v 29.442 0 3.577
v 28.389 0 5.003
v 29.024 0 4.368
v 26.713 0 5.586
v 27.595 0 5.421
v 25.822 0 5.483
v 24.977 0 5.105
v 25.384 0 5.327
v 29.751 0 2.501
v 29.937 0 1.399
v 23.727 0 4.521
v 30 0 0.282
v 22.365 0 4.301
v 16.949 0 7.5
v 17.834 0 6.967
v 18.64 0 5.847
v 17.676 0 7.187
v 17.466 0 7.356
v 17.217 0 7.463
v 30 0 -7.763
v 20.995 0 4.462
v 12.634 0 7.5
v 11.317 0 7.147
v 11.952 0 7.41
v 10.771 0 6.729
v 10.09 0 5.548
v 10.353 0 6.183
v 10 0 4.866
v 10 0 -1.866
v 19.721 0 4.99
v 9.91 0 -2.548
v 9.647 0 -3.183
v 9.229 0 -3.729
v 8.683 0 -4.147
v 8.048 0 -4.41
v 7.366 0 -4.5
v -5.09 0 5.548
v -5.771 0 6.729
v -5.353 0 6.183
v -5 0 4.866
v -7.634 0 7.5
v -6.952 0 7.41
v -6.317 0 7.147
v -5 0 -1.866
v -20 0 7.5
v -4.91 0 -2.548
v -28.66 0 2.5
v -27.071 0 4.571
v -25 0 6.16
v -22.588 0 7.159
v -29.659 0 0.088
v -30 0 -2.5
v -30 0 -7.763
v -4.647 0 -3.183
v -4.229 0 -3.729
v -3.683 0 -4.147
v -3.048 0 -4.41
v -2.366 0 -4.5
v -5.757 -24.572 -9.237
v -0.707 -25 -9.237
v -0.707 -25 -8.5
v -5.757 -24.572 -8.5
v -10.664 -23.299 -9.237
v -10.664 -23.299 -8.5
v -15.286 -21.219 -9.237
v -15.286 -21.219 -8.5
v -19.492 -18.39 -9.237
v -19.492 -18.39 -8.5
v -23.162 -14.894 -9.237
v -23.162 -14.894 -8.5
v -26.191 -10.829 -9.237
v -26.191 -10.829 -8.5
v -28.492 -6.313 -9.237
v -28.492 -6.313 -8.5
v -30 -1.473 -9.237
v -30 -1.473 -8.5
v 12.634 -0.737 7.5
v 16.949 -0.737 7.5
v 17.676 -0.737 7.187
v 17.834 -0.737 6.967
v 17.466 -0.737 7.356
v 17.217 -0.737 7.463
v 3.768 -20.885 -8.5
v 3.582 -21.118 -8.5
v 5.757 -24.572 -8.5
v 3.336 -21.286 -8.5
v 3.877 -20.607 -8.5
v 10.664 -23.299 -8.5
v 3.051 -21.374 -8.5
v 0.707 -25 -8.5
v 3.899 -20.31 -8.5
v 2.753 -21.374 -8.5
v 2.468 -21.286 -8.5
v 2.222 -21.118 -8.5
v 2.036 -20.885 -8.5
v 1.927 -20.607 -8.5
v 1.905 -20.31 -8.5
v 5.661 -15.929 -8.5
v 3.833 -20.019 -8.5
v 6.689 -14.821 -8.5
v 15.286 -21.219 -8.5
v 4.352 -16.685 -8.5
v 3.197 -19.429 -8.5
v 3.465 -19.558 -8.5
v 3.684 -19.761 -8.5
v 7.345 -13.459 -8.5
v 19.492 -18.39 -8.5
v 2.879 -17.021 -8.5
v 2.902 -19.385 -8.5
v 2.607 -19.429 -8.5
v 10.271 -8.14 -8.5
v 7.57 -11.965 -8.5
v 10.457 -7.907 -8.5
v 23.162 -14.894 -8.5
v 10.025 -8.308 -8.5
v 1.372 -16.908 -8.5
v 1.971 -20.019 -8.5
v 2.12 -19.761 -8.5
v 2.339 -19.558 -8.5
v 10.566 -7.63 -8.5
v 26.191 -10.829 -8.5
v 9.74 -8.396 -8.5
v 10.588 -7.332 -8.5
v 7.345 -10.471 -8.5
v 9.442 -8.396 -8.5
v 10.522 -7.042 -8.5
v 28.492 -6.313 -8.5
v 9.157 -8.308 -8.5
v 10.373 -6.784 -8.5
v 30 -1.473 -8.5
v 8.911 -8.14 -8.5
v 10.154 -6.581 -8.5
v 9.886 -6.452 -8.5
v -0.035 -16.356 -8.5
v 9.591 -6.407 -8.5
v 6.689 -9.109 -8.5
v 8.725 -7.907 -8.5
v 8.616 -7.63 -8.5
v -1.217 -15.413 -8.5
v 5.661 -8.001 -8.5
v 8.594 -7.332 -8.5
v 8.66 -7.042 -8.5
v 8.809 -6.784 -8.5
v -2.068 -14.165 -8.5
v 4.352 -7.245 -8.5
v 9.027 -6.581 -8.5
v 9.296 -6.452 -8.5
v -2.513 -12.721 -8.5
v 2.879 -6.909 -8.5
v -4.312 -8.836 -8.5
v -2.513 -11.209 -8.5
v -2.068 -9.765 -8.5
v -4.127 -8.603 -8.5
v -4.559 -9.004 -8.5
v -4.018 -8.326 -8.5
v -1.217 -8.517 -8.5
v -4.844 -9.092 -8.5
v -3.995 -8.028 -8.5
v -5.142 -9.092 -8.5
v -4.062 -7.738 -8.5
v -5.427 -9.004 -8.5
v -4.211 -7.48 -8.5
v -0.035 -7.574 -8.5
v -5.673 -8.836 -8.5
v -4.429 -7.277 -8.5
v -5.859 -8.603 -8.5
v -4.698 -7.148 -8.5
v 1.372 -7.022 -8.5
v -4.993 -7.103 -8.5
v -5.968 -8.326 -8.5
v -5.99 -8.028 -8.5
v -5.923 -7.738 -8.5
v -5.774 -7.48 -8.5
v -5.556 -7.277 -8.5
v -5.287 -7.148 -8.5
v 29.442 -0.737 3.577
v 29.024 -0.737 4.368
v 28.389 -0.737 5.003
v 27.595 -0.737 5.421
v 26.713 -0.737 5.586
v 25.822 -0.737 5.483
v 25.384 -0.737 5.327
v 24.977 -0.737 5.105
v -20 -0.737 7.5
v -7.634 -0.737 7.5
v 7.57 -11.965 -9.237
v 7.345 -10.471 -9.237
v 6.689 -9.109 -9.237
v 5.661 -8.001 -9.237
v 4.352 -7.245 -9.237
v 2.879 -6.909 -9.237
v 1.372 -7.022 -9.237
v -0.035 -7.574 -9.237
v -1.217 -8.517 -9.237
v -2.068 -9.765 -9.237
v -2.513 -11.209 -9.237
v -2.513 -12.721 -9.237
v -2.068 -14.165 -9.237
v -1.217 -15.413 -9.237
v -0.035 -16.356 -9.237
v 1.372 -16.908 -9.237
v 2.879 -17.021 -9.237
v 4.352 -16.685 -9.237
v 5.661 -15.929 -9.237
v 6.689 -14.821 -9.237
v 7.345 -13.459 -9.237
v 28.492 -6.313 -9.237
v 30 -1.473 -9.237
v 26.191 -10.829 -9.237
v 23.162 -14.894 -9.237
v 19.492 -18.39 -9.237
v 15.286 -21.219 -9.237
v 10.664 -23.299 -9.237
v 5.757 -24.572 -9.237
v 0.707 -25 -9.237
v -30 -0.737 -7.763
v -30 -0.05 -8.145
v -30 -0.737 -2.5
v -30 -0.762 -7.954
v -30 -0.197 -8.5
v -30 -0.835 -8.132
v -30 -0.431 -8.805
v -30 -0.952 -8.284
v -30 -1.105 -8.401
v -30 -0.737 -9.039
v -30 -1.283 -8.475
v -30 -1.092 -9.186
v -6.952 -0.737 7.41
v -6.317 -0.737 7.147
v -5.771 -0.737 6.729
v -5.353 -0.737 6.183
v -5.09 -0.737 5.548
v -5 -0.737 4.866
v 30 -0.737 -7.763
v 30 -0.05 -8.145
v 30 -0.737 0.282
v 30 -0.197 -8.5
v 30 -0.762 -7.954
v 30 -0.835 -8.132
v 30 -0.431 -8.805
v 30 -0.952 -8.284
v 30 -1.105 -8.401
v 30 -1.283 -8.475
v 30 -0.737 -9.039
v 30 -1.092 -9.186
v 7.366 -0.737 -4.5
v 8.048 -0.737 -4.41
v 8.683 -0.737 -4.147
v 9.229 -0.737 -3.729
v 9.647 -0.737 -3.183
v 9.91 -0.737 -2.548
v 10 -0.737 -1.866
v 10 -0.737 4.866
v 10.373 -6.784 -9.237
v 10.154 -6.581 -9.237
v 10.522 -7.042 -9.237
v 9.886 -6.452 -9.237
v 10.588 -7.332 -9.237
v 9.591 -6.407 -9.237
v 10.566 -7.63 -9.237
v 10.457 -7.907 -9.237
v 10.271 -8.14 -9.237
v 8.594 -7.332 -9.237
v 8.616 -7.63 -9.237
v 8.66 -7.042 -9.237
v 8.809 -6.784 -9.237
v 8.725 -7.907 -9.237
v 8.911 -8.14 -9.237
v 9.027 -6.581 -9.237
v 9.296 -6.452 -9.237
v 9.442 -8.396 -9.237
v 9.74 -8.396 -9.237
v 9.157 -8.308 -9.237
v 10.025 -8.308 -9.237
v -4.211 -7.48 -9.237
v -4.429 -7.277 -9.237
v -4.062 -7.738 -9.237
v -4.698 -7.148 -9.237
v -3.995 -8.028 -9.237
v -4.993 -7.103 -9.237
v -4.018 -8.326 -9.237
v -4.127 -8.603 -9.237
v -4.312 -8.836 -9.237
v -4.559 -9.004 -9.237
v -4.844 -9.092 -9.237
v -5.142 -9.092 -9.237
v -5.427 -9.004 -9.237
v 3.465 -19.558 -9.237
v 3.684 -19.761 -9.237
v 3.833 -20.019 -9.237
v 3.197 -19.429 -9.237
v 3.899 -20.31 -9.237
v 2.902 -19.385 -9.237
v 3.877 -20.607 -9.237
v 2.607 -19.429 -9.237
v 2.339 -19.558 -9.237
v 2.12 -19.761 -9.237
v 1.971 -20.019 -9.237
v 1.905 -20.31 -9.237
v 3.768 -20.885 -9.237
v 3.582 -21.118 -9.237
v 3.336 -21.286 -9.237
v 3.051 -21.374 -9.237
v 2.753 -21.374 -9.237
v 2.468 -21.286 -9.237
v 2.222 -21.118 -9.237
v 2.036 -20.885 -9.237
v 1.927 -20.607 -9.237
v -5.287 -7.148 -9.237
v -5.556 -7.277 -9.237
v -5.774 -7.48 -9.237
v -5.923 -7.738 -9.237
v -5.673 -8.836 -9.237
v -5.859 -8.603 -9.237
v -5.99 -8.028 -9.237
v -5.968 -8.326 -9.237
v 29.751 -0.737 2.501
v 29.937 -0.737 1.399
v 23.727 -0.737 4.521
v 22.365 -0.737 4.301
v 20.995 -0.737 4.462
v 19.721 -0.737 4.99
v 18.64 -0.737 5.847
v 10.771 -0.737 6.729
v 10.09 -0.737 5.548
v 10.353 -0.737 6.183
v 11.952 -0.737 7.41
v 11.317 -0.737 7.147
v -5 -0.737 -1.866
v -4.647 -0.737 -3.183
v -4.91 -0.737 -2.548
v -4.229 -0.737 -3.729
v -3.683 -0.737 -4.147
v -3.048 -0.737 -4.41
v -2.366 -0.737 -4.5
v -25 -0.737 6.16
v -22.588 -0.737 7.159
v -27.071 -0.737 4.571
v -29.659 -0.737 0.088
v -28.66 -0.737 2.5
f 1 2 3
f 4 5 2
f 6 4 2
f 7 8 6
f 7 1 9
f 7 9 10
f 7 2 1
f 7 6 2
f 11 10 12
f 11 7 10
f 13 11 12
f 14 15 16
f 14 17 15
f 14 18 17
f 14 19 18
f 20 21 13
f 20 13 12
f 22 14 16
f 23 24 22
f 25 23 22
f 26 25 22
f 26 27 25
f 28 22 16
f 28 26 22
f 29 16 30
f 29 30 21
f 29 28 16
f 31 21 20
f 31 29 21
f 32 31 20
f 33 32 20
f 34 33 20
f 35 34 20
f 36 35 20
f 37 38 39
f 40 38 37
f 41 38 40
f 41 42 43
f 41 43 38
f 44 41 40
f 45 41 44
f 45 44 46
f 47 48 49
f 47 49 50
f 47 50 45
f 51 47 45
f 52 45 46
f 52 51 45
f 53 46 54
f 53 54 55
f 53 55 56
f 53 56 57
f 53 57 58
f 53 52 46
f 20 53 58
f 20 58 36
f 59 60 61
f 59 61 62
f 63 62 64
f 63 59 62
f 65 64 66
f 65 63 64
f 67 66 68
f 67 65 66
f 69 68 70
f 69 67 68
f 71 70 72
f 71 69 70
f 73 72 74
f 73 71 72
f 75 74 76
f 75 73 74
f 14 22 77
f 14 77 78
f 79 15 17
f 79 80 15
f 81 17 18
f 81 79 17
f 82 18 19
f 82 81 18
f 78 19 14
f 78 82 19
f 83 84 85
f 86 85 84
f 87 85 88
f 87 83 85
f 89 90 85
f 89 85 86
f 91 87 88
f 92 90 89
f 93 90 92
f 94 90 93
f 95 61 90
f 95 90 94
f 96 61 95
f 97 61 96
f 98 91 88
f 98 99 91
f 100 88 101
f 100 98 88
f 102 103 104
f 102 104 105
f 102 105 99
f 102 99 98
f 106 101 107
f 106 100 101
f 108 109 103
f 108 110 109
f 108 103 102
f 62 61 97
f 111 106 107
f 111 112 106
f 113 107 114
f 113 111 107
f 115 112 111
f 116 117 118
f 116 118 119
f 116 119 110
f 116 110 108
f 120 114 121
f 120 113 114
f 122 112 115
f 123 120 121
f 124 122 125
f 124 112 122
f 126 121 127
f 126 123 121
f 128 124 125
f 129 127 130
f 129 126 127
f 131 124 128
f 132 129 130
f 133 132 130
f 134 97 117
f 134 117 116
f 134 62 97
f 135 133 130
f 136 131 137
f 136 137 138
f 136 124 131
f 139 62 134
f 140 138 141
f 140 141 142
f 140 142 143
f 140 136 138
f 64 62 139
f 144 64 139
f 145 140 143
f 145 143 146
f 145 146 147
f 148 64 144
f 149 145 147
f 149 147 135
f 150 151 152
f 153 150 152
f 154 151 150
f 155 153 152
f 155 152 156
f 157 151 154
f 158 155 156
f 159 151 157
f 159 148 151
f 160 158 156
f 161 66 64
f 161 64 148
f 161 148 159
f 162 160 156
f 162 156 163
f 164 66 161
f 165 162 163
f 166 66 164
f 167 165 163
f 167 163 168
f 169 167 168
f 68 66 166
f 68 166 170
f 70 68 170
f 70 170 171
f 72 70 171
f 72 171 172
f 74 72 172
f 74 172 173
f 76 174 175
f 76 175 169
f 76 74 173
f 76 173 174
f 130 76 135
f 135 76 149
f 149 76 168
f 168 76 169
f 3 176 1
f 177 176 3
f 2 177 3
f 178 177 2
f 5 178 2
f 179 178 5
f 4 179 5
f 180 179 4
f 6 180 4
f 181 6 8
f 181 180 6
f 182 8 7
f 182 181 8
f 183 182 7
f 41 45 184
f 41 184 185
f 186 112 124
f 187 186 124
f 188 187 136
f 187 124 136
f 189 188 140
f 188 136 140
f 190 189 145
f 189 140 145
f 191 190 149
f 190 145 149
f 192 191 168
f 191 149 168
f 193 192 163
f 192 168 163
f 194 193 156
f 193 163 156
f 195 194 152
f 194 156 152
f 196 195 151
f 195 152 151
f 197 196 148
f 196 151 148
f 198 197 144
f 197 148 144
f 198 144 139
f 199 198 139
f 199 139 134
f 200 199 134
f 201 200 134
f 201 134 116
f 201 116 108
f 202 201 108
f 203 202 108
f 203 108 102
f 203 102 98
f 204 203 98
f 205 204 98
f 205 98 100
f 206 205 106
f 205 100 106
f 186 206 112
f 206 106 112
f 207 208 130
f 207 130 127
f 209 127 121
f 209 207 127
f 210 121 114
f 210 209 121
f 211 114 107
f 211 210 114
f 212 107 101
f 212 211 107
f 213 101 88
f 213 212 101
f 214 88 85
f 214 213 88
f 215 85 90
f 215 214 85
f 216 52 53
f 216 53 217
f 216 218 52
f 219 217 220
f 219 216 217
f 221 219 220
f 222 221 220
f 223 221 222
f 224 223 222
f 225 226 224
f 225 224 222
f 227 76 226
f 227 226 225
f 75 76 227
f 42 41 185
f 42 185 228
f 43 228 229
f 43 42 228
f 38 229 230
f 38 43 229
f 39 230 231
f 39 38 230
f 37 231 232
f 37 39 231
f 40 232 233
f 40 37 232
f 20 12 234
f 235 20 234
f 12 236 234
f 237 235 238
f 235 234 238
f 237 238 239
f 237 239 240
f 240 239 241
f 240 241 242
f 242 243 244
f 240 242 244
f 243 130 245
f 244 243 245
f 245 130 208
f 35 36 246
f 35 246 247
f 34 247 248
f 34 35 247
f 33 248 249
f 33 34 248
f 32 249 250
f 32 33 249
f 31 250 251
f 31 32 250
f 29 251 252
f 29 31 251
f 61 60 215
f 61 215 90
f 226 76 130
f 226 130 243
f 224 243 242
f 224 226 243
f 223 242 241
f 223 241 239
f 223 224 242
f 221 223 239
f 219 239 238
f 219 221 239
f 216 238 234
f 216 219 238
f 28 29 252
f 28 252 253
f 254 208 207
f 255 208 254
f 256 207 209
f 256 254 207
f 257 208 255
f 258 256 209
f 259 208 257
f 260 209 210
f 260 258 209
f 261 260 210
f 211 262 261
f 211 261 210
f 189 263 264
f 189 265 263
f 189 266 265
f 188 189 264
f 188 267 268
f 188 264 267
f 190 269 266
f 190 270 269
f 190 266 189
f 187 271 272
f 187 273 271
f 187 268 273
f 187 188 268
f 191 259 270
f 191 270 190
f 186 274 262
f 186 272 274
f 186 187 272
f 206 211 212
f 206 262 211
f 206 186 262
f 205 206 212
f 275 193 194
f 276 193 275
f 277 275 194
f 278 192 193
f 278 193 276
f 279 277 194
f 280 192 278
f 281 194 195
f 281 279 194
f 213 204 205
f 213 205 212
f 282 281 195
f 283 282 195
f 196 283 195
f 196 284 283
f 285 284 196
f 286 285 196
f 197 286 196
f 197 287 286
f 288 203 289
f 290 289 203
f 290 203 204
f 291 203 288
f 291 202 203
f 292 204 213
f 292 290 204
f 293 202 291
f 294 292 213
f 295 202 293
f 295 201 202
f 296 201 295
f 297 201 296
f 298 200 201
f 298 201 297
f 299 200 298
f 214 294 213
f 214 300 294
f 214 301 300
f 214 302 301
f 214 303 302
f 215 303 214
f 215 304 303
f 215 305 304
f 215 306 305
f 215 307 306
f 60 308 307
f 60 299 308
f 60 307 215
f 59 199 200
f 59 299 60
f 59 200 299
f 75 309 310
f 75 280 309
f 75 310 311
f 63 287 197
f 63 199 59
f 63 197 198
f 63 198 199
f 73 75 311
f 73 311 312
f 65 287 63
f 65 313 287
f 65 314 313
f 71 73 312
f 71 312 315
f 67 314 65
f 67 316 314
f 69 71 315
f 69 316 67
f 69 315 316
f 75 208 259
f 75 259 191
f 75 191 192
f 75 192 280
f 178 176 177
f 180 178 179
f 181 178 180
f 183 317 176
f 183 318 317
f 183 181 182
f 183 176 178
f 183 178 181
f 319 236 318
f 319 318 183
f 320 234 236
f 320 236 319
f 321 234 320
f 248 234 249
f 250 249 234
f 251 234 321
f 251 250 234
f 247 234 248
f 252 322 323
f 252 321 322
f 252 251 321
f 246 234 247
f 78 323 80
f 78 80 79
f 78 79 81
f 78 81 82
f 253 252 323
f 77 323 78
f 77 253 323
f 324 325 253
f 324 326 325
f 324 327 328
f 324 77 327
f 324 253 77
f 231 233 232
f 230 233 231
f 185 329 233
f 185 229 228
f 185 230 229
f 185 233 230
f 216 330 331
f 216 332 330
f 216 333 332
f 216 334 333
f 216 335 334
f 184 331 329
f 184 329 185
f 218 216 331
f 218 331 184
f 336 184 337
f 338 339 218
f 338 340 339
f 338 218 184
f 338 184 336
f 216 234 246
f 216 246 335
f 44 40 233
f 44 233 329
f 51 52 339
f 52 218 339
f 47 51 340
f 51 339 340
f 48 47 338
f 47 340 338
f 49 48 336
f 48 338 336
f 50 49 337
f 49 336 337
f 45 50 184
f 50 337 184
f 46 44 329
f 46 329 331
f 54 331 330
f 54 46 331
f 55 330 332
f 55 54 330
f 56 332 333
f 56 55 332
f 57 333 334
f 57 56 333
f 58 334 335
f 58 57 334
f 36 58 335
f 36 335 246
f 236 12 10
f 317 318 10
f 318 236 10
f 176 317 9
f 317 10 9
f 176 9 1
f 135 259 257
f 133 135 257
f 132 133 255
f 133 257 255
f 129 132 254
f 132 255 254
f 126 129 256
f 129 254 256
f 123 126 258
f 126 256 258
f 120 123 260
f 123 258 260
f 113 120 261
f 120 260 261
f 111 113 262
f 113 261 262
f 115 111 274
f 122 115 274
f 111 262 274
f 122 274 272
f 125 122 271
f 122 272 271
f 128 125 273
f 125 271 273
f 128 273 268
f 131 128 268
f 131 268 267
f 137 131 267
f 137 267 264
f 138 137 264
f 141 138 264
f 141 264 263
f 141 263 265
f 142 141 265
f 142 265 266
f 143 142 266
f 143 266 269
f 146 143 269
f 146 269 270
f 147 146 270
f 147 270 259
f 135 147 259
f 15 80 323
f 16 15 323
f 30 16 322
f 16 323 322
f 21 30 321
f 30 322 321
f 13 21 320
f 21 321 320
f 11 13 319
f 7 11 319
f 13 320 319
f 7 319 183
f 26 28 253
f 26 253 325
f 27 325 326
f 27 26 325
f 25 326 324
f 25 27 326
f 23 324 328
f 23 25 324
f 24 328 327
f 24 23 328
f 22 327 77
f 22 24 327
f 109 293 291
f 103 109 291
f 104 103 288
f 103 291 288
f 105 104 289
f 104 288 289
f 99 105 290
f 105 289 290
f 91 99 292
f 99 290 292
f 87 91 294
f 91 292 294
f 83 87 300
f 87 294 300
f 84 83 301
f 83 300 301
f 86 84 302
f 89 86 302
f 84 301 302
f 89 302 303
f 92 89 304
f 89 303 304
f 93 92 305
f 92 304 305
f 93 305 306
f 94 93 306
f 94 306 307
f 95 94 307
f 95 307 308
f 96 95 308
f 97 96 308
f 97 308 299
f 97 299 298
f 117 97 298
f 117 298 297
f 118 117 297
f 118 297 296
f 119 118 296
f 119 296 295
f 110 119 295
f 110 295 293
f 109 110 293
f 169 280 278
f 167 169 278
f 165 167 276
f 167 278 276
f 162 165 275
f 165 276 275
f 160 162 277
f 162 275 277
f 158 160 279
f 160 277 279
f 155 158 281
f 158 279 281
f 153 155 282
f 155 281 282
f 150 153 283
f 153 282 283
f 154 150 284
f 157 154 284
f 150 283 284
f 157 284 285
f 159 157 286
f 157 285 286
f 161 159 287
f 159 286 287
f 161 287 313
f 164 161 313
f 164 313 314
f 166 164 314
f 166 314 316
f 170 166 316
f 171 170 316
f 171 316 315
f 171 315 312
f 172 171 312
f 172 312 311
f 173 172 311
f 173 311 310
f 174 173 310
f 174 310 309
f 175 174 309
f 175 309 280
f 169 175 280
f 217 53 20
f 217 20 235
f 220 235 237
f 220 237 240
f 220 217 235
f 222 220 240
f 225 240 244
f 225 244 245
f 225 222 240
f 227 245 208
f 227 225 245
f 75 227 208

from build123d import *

# Parameters (mm, degrees)
BASE_FLANGE1_DEPTH = 0.7366
EDGE_FLANGE1_DEPTH = 60
SKETCH10_R         = 1
CUT_EXTRUDE1_DEPTH = 10
SKETCH11_R         = 4.999999998
CUT_EXTRUDE2_DEPTH = 10
FILLET1_START      = -9.2366
FILLET1_DEPTH      = 0.7366
FILLET2_R          = 10
FILLET3_R          = 10
FILLET4_R          = 3
FILLET5_R          = 1
SKETCH14_R         = 5.07
SKETCH14_R_2       = 4.97
CUT_EXTRUDE4_DEPTH = 0.7366


with BuildPart() as part:
    # Base-Flange1: sheet metal written as solids
    # Sketch2 → Base-Flange1 (new body)
    with BuildSketch(Plane(origin=(0, 0, 0), x_dir=(1, 0, 0), z_dir=(0, 1, 0))):
        with BuildLine():
            Line((-2.36642583, 4.5), (7.36642583, 4.5))
            ThreePointArc((7.36642583, 4.5), (9.228643984, 3.728643984), (10, 1.86642583))
            Line((10, 1.86642583), (10, -4.86642583))
            ThreePointArc((10, -4.86642583), (10.771356016, -6.728643984), (12.63357417, -7.5))
            Line((12.63357417, -7.5), (30, -7.5))
            Line((30, -7.5), (30, 7.5))
            Line((30, 7.5), (-30, 7.5))
            Line((-30, 7.5), (-30, -7.5))
            Line((-30, -7.5), (-7.63357417, -7.5))
            ThreePointArc((-7.63357417, -7.5), (-5.771356016, -6.728643984), (-5, -4.86642583))
            Line((-5, -4.86642583), (-5, 1.86642583))
            ThreePointArc((-5, 1.86642583), (-4.228643984, 3.728643984), (-2.36642583, 4.5))
        make_face()
    extrude(amount=-BASE_FLANGE1_DEPTH)

    # Edge-Flange1: sheet metal written as solids
    # Edge-Flange1 section (on a plane across the edge) → Edge-Flange1 (add)
    with BuildSketch(Plane(origin=(-30, -0.7366, -8.5), x_dir=(0, 0, 1), z_dir=(1, 0, 0))):
        with BuildLine():
            Line((-0.7366, 0.7366), (-0.7366, 24.2634))
            Line((-0.7366, 24.2634), (0, 24.2634))
            Line((0, 24.2634), (0, 0.7366))
            ThreePointArc((0, 0.7366), (0.215745145, 0.215745145), (0.7366, 0))
            Line((0.7366, 0), (1, 0))
            Line((1, 0), (1, -0.7366))
            Line((1, -0.7366), (0.7366, -0.7366))
            ThreePointArc((0.7366, -0.7366), (-0.30510971, -0.30510971), (-0.7366, 0.7366))
        make_face()
    extrude(amount=EDGE_FLANGE1_DEPTH)

    # Sketch10 → Cut-Extrude1 (cut)
    with BuildSketch(Plane(origin=(0, 0, -9.2366), x_dir=(-1, 0, 0), z_dir=(0, 0, -1))):
        with Locations(Location((-9.590779371, -7.407129747, 0), (0, 0, 90))):
            Circle(SKETCH10_R)
        with Locations(Location((4.992621112, -8.103140058, 0), (0, 0, 90))):
            Circle(SKETCH10_R)
        with Locations(Location((-2.90184174, -20.384730194, 0), (0, 0, 90))):
            Circle(SKETCH10_R)
    extrude(amount=-CUT_EXTRUDE1_DEPTH, mode=Mode.SUBTRACT)

    # Sketch11 → Cut-Extrude2 (cut)
    with BuildSketch(Plane.XZ.offset(0.7366)):
        with Locations((22.255915642, 9.300009257)):
            Circle(SKETCH11_R)
    extrude(amount=-CUT_EXTRUDE2_DEPTH, mode=Mode.SUBTRACT)

    # Fillet1: read off the stored shape, not the designer's step
    # Fillet1 outline → Fillet1 (cut)
    with BuildSketch(Plane.XY.offset(FILLET1_START)):
        with BuildLine():
            ThreePointArc((30, -1.4732), (19.492381656, -18.390126122), (0.706695616, -25))
            Line((0.706695616, -25), (30, -25))
            Line((30, -25), (30, -1.4732))
        make_face()
        with BuildLine():
            ThreePointArc((-0.706695616, -25), (-19.492381656, -18.390126122), (-30, -1.4732))
            Line((-30, -1.4732), (-30, -25))
            Line((-30, -25), (-0.706695616, -25))
        make_face()
    extrude(amount=FILLET1_DEPTH, mode=Mode.SUBTRACT)

    # Fillet2
    fillet2_edges = [part.edges().sort_by_distance(p)[0] for p in [
        (-30, -0.3683, 7.5),
    ]]
    fillet(fillet2_edges, radius=FILLET2_R)

    # Fillet3
    # the kernel refuses this fillet: 10 mm, written as the material it takes off along each edge
    with BuildSketch(Plane(origin=(30, 18.045823122, 7.5), x_dir=(0, 0, -1), z_dir=(0, -1, 0))) as fillet3_piece_1:
        with BuildLine():
            CenterArc((7.218329249, -10), FILLET3_R, 90, 46.206018187)
            Line((0, -3.079326416), (-0.144366585, -2.940912944))
            ThreePointArc((-0.144366585, -2.940912944), (-0.2, -1.539663208), (-0.2, 0))
            Line((-0.2, 0), (0, 0.2))
            Line((0, 0.2), (7.218329249, 0.2))
            Line((7.218329249, 0.2), (7.218329249, 0))
        make_face()
    extrude(amount=36.828246244, mode=Mode.SUBTRACT)

    # Fillet4
    fillet4_edges = [part.edges().sort_by_distance(p)[0] for p in [
        (26.920673584, -0.3683, 7.5),
    ]]
    fillet(fillet4_edges, radius=FILLET4_R)

    # Fillet5
    fillet5_edges = [part.edges().sort_by_distance(p)[0] for p in [
        (17.5911577, -0.3683, 7.5),
    ]]
    fillet(fillet5_edges, radius=FILLET5_R)

    # Sketch14 → Cut-Extrude4 (cut)
    # profile 1 of 2: a face of its own
    with BuildSketch(Plane.XY.offset(-8.5)):
        with Locations((2.5, -11.965)):
            Circle(SKETCH14_R)
        with Locations((2.5, -11.965)):
            Circle(SKETCH14_R_2, mode=Mode.SUBTRACT)
    # profile 2 of 2: a face of its own
    with BuildSketch(Plane.XY.offset(-8.5)):
        with Locations((2.5, -11.965)):
            Circle(SKETCH14_R_2)
    extrude(amount=-CUT_EXTRUDE4_DEPTH, mode=Mode.SUBTRACT)


solid = part.part
